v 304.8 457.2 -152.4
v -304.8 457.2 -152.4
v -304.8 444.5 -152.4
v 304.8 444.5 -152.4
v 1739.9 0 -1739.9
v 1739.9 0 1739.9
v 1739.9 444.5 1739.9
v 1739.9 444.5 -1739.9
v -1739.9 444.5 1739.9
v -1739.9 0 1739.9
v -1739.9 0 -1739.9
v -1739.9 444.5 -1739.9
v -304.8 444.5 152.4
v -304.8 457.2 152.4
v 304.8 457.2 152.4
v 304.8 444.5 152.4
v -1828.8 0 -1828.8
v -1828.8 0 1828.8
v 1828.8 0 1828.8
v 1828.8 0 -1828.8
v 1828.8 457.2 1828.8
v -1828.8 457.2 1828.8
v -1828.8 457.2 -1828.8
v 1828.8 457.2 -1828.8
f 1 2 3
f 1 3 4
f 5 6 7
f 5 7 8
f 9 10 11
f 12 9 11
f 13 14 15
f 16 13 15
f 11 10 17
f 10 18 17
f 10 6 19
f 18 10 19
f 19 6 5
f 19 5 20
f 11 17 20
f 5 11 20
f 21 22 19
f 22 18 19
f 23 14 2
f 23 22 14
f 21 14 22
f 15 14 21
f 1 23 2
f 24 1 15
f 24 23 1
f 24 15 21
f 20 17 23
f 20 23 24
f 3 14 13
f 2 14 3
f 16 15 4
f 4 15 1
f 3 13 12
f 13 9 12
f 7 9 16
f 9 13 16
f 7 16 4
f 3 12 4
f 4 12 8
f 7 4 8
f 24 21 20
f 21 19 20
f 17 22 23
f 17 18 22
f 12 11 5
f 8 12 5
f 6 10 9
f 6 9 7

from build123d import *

# Parameters (mm, degrees)
SKETCH1_W           = 3657.6
SKETCH1_H           = 3657.6
SKETCH1_W_2         = 3479.8
SKETCH1_H_2         = 3479.8
BOSS_EXTRUDE1_DEPTH = 444.5
SKETCH2_W           = 3657.6
SKETCH2_H           = 3657.6
BOSS_EXTRUDE2_DEPTH = 12.7
SKETCH3_W           = 609.6
SKETCH3_H           = 304.8
CUT_EXTRUDE1_DEPTH  = 2627.414041997


with BuildPart() as part:
    # Sketch1 → Boss-Extrude1 (new body)
    with BuildSketch(Plane(origin=(0, 0, 0), x_dir=(1, 0, 0), z_dir=(0, 1, 0))):
        Rectangle(SKETCH1_W, SKETCH1_H)
        Rectangle(SKETCH1_W_2, SKETCH1_H_2, mode=Mode.SUBTRACT)
    extrude(amount=BOSS_EXTRUDE1_DEPTH)

    # Sketch2 → Boss-Extrude2 (add)
    with BuildSketch(Plane(origin=(0, 444.5, 0), x_dir=(1, 0, 0), z_dir=(0, 1, 0))):
        Rectangle(SKETCH2_W, SKETCH2_H)
    extrude(amount=BOSS_EXTRUDE2_DEPTH)

    # Sketch3 → Cut-Extrude1 (cut, through all)
    with BuildSketch(Plane(origin=(0, 457.2, 0), x_dir=(1, 0, 0), z_dir=(0, 1, 0))):
        Rectangle(SKETCH3_W, SKETCH3_H)
    extrude(amount=-CUT_EXTRUDE1_DEPTH, mode=Mode.SUBTRACT)


solid = part.part
